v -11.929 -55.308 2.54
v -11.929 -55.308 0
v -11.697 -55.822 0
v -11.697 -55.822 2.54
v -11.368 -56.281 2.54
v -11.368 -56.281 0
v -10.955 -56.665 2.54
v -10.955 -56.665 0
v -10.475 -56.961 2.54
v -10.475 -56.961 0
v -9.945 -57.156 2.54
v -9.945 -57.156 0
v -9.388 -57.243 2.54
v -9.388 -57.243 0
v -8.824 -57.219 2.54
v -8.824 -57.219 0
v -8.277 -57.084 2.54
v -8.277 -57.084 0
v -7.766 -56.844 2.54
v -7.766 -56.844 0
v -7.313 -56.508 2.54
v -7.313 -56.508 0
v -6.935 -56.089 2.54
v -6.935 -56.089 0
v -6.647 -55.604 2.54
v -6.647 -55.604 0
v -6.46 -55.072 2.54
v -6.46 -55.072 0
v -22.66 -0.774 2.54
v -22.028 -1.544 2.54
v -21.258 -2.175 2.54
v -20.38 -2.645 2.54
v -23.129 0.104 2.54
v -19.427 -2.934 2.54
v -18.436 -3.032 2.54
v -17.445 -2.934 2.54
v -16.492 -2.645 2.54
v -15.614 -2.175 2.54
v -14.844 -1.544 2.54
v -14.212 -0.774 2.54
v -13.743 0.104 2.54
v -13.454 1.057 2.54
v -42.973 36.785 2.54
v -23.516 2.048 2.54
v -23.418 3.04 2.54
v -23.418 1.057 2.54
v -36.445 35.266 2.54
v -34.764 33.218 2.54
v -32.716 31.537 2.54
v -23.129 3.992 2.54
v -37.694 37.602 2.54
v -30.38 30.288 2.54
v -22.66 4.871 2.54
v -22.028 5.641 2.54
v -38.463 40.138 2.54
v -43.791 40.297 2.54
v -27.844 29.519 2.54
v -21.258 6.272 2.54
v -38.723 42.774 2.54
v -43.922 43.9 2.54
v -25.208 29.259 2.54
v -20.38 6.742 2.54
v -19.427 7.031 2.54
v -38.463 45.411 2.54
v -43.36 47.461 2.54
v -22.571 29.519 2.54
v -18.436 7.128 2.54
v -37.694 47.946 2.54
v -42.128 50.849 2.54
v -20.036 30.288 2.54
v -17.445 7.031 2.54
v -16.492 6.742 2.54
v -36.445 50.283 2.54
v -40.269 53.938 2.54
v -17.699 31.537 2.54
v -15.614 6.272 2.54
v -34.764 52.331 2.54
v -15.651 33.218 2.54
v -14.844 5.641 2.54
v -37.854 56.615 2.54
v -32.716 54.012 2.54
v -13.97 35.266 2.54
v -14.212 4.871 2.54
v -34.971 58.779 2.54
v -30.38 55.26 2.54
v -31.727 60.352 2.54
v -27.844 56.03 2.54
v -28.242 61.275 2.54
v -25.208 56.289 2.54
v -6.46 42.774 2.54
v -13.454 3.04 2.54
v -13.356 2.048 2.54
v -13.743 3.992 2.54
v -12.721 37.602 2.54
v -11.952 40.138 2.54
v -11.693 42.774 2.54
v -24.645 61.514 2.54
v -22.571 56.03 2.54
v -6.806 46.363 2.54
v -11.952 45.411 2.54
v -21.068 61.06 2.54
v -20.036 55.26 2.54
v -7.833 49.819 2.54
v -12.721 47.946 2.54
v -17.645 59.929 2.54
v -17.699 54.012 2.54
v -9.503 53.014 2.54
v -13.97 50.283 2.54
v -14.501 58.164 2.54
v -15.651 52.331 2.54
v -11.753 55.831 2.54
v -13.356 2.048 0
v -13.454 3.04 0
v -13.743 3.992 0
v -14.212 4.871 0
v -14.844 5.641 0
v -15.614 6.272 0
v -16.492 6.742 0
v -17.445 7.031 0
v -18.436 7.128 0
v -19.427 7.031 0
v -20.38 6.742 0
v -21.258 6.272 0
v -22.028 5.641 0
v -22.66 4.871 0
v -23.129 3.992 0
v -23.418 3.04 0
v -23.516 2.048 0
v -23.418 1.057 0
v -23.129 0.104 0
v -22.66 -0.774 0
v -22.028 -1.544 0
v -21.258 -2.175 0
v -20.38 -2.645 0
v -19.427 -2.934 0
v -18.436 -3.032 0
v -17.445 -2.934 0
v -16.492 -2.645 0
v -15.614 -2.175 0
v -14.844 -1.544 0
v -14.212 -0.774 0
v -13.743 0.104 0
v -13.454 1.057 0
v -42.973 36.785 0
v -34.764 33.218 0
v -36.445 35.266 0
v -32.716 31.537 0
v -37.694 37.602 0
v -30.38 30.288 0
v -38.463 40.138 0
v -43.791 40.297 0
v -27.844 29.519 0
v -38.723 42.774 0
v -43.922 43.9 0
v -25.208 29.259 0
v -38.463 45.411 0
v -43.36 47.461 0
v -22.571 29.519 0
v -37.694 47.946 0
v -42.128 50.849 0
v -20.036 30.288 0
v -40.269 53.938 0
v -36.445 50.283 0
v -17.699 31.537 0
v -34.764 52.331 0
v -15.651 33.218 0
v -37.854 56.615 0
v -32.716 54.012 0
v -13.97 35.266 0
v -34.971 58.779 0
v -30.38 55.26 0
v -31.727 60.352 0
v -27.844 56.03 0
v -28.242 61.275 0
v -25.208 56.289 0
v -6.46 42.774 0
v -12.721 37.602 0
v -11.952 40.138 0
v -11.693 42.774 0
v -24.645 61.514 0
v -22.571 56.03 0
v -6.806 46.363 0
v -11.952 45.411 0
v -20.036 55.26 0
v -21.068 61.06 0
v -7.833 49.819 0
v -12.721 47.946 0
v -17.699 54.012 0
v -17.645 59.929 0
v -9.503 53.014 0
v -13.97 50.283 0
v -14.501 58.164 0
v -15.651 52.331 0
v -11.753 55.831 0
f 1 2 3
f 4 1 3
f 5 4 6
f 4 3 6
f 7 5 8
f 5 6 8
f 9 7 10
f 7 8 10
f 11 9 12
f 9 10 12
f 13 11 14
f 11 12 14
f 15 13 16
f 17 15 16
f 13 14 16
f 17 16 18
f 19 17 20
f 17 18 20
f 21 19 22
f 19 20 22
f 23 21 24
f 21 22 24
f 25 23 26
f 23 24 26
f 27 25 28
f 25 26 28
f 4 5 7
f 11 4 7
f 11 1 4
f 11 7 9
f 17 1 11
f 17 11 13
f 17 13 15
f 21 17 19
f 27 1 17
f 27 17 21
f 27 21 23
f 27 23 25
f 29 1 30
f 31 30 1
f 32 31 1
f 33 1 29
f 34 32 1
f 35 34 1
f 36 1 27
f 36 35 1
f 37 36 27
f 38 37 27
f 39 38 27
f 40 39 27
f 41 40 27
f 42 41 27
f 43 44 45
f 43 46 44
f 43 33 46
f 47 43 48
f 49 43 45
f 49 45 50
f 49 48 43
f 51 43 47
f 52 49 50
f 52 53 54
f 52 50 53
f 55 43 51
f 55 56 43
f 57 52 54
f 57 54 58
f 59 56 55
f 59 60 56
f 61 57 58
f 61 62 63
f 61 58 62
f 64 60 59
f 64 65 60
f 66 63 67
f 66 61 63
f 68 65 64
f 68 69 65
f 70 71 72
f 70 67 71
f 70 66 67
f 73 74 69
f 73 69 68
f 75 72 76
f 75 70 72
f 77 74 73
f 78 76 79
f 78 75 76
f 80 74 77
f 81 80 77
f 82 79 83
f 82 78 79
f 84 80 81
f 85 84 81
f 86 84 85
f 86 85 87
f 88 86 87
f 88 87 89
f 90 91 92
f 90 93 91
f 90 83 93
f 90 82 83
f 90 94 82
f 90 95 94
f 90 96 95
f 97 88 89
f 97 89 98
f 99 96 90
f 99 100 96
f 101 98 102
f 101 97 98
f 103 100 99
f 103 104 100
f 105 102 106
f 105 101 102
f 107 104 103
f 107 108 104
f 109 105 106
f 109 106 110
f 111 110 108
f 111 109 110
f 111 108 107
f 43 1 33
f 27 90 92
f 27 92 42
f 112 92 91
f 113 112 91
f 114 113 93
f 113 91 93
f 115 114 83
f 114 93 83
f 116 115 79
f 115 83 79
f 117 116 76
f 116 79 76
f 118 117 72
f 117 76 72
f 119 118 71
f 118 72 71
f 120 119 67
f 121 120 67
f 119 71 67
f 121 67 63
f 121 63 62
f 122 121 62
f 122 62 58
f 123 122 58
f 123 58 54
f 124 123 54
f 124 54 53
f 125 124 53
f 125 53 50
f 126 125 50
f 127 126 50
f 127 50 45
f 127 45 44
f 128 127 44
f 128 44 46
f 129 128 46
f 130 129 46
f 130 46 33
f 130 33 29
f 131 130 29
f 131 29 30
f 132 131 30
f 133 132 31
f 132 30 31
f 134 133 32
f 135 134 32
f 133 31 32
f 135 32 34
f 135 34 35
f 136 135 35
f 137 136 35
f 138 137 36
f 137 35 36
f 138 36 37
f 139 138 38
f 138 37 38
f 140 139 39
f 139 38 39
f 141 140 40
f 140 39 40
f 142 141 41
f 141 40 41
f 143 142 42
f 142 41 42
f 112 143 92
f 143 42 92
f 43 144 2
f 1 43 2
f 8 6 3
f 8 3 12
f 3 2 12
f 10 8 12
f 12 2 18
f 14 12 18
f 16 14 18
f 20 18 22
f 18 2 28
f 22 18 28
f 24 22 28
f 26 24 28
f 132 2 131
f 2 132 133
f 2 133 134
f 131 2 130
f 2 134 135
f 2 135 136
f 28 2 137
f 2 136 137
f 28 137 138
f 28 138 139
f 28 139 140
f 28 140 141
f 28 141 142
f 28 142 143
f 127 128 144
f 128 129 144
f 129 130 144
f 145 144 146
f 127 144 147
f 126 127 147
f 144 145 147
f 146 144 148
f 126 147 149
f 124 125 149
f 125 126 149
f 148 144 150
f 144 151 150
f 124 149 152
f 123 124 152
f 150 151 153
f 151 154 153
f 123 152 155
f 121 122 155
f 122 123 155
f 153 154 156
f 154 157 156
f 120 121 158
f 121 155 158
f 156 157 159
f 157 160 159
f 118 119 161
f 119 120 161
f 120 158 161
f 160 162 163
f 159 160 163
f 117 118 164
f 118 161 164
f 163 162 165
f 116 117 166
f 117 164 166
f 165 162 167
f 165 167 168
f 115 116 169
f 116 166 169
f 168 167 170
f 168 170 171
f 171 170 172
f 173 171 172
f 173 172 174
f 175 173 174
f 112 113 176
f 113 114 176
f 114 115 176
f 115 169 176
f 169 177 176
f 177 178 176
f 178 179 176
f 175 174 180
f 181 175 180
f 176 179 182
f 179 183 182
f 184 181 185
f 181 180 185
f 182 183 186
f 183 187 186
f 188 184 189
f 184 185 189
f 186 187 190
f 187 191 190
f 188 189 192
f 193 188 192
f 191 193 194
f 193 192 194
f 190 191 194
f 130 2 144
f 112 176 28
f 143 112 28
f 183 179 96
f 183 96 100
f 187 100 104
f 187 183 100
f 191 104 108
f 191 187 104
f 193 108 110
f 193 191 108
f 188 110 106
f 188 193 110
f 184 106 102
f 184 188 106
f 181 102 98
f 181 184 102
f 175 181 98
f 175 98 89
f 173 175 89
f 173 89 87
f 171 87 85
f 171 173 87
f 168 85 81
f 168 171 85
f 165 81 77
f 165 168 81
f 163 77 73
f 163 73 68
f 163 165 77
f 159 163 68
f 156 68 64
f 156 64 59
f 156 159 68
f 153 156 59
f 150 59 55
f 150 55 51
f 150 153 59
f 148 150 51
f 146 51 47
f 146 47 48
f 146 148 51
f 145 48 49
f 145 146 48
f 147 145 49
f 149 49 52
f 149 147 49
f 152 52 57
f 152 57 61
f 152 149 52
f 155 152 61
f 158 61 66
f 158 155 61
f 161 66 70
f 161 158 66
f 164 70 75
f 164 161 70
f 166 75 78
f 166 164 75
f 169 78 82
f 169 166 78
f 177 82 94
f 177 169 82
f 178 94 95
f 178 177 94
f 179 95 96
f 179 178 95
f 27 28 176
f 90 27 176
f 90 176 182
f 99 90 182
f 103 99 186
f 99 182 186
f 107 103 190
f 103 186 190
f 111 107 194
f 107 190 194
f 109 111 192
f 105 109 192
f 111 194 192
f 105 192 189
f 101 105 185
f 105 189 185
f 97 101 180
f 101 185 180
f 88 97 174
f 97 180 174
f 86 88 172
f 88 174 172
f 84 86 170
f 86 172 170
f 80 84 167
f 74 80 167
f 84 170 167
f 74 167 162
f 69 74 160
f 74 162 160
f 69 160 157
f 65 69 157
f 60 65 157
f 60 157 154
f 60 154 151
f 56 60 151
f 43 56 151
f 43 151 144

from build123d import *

# Parameters (mm, degrees)
F0_R     = 13.515014
F1_DEPTH = 2.54
F2_R     = 5.08
F3_DEPTH = 12.192


with BuildPart() as f1:
    # F0 (on Top) → F1 (new body)
    with BuildSketch(Plane.XY):
        with BuildLine():
            ThreePointArc((-42.973429, 36.785428), (-22.173248, 24.273337), (-6.4596, 42.774181))
            ThreePointArc((-6.4596, 42.774181), (-28.242016, 61.275024), (-42.973429, 36.785428))
        make_face()
        with Locations((-25.207632, 42.774181)):
            Circle(F0_R, mode=Mode.SUBTRACT)
        with BuildLine():
            Line((-6.4596, -55.071786), (-6.4596, 42.774181))
            ThreePointArc((-6.4596, 42.774181), (-22.173248, 24.273337), (-42.973429, 36.785428))
            Line((-42.973429, 36.785428), (-11.929202, -55.308118))
            ThreePointArc((-11.929202, -55.308118), (-9.105606, -57.244995), (-6.4596, -55.071786))
        make_face()
    extrude(amount=F1_DEPTH)

    # F2 (on face) → F3 (cut)
    with BuildSketch(Plane.XY.offset(2.54)):
        with Locations((-18.436039, 2.048449)):
            Circle(F2_R)
    extrude(amount=-F3_DEPTH, mode=Mode.SUBTRACT)


solid = f1.part
